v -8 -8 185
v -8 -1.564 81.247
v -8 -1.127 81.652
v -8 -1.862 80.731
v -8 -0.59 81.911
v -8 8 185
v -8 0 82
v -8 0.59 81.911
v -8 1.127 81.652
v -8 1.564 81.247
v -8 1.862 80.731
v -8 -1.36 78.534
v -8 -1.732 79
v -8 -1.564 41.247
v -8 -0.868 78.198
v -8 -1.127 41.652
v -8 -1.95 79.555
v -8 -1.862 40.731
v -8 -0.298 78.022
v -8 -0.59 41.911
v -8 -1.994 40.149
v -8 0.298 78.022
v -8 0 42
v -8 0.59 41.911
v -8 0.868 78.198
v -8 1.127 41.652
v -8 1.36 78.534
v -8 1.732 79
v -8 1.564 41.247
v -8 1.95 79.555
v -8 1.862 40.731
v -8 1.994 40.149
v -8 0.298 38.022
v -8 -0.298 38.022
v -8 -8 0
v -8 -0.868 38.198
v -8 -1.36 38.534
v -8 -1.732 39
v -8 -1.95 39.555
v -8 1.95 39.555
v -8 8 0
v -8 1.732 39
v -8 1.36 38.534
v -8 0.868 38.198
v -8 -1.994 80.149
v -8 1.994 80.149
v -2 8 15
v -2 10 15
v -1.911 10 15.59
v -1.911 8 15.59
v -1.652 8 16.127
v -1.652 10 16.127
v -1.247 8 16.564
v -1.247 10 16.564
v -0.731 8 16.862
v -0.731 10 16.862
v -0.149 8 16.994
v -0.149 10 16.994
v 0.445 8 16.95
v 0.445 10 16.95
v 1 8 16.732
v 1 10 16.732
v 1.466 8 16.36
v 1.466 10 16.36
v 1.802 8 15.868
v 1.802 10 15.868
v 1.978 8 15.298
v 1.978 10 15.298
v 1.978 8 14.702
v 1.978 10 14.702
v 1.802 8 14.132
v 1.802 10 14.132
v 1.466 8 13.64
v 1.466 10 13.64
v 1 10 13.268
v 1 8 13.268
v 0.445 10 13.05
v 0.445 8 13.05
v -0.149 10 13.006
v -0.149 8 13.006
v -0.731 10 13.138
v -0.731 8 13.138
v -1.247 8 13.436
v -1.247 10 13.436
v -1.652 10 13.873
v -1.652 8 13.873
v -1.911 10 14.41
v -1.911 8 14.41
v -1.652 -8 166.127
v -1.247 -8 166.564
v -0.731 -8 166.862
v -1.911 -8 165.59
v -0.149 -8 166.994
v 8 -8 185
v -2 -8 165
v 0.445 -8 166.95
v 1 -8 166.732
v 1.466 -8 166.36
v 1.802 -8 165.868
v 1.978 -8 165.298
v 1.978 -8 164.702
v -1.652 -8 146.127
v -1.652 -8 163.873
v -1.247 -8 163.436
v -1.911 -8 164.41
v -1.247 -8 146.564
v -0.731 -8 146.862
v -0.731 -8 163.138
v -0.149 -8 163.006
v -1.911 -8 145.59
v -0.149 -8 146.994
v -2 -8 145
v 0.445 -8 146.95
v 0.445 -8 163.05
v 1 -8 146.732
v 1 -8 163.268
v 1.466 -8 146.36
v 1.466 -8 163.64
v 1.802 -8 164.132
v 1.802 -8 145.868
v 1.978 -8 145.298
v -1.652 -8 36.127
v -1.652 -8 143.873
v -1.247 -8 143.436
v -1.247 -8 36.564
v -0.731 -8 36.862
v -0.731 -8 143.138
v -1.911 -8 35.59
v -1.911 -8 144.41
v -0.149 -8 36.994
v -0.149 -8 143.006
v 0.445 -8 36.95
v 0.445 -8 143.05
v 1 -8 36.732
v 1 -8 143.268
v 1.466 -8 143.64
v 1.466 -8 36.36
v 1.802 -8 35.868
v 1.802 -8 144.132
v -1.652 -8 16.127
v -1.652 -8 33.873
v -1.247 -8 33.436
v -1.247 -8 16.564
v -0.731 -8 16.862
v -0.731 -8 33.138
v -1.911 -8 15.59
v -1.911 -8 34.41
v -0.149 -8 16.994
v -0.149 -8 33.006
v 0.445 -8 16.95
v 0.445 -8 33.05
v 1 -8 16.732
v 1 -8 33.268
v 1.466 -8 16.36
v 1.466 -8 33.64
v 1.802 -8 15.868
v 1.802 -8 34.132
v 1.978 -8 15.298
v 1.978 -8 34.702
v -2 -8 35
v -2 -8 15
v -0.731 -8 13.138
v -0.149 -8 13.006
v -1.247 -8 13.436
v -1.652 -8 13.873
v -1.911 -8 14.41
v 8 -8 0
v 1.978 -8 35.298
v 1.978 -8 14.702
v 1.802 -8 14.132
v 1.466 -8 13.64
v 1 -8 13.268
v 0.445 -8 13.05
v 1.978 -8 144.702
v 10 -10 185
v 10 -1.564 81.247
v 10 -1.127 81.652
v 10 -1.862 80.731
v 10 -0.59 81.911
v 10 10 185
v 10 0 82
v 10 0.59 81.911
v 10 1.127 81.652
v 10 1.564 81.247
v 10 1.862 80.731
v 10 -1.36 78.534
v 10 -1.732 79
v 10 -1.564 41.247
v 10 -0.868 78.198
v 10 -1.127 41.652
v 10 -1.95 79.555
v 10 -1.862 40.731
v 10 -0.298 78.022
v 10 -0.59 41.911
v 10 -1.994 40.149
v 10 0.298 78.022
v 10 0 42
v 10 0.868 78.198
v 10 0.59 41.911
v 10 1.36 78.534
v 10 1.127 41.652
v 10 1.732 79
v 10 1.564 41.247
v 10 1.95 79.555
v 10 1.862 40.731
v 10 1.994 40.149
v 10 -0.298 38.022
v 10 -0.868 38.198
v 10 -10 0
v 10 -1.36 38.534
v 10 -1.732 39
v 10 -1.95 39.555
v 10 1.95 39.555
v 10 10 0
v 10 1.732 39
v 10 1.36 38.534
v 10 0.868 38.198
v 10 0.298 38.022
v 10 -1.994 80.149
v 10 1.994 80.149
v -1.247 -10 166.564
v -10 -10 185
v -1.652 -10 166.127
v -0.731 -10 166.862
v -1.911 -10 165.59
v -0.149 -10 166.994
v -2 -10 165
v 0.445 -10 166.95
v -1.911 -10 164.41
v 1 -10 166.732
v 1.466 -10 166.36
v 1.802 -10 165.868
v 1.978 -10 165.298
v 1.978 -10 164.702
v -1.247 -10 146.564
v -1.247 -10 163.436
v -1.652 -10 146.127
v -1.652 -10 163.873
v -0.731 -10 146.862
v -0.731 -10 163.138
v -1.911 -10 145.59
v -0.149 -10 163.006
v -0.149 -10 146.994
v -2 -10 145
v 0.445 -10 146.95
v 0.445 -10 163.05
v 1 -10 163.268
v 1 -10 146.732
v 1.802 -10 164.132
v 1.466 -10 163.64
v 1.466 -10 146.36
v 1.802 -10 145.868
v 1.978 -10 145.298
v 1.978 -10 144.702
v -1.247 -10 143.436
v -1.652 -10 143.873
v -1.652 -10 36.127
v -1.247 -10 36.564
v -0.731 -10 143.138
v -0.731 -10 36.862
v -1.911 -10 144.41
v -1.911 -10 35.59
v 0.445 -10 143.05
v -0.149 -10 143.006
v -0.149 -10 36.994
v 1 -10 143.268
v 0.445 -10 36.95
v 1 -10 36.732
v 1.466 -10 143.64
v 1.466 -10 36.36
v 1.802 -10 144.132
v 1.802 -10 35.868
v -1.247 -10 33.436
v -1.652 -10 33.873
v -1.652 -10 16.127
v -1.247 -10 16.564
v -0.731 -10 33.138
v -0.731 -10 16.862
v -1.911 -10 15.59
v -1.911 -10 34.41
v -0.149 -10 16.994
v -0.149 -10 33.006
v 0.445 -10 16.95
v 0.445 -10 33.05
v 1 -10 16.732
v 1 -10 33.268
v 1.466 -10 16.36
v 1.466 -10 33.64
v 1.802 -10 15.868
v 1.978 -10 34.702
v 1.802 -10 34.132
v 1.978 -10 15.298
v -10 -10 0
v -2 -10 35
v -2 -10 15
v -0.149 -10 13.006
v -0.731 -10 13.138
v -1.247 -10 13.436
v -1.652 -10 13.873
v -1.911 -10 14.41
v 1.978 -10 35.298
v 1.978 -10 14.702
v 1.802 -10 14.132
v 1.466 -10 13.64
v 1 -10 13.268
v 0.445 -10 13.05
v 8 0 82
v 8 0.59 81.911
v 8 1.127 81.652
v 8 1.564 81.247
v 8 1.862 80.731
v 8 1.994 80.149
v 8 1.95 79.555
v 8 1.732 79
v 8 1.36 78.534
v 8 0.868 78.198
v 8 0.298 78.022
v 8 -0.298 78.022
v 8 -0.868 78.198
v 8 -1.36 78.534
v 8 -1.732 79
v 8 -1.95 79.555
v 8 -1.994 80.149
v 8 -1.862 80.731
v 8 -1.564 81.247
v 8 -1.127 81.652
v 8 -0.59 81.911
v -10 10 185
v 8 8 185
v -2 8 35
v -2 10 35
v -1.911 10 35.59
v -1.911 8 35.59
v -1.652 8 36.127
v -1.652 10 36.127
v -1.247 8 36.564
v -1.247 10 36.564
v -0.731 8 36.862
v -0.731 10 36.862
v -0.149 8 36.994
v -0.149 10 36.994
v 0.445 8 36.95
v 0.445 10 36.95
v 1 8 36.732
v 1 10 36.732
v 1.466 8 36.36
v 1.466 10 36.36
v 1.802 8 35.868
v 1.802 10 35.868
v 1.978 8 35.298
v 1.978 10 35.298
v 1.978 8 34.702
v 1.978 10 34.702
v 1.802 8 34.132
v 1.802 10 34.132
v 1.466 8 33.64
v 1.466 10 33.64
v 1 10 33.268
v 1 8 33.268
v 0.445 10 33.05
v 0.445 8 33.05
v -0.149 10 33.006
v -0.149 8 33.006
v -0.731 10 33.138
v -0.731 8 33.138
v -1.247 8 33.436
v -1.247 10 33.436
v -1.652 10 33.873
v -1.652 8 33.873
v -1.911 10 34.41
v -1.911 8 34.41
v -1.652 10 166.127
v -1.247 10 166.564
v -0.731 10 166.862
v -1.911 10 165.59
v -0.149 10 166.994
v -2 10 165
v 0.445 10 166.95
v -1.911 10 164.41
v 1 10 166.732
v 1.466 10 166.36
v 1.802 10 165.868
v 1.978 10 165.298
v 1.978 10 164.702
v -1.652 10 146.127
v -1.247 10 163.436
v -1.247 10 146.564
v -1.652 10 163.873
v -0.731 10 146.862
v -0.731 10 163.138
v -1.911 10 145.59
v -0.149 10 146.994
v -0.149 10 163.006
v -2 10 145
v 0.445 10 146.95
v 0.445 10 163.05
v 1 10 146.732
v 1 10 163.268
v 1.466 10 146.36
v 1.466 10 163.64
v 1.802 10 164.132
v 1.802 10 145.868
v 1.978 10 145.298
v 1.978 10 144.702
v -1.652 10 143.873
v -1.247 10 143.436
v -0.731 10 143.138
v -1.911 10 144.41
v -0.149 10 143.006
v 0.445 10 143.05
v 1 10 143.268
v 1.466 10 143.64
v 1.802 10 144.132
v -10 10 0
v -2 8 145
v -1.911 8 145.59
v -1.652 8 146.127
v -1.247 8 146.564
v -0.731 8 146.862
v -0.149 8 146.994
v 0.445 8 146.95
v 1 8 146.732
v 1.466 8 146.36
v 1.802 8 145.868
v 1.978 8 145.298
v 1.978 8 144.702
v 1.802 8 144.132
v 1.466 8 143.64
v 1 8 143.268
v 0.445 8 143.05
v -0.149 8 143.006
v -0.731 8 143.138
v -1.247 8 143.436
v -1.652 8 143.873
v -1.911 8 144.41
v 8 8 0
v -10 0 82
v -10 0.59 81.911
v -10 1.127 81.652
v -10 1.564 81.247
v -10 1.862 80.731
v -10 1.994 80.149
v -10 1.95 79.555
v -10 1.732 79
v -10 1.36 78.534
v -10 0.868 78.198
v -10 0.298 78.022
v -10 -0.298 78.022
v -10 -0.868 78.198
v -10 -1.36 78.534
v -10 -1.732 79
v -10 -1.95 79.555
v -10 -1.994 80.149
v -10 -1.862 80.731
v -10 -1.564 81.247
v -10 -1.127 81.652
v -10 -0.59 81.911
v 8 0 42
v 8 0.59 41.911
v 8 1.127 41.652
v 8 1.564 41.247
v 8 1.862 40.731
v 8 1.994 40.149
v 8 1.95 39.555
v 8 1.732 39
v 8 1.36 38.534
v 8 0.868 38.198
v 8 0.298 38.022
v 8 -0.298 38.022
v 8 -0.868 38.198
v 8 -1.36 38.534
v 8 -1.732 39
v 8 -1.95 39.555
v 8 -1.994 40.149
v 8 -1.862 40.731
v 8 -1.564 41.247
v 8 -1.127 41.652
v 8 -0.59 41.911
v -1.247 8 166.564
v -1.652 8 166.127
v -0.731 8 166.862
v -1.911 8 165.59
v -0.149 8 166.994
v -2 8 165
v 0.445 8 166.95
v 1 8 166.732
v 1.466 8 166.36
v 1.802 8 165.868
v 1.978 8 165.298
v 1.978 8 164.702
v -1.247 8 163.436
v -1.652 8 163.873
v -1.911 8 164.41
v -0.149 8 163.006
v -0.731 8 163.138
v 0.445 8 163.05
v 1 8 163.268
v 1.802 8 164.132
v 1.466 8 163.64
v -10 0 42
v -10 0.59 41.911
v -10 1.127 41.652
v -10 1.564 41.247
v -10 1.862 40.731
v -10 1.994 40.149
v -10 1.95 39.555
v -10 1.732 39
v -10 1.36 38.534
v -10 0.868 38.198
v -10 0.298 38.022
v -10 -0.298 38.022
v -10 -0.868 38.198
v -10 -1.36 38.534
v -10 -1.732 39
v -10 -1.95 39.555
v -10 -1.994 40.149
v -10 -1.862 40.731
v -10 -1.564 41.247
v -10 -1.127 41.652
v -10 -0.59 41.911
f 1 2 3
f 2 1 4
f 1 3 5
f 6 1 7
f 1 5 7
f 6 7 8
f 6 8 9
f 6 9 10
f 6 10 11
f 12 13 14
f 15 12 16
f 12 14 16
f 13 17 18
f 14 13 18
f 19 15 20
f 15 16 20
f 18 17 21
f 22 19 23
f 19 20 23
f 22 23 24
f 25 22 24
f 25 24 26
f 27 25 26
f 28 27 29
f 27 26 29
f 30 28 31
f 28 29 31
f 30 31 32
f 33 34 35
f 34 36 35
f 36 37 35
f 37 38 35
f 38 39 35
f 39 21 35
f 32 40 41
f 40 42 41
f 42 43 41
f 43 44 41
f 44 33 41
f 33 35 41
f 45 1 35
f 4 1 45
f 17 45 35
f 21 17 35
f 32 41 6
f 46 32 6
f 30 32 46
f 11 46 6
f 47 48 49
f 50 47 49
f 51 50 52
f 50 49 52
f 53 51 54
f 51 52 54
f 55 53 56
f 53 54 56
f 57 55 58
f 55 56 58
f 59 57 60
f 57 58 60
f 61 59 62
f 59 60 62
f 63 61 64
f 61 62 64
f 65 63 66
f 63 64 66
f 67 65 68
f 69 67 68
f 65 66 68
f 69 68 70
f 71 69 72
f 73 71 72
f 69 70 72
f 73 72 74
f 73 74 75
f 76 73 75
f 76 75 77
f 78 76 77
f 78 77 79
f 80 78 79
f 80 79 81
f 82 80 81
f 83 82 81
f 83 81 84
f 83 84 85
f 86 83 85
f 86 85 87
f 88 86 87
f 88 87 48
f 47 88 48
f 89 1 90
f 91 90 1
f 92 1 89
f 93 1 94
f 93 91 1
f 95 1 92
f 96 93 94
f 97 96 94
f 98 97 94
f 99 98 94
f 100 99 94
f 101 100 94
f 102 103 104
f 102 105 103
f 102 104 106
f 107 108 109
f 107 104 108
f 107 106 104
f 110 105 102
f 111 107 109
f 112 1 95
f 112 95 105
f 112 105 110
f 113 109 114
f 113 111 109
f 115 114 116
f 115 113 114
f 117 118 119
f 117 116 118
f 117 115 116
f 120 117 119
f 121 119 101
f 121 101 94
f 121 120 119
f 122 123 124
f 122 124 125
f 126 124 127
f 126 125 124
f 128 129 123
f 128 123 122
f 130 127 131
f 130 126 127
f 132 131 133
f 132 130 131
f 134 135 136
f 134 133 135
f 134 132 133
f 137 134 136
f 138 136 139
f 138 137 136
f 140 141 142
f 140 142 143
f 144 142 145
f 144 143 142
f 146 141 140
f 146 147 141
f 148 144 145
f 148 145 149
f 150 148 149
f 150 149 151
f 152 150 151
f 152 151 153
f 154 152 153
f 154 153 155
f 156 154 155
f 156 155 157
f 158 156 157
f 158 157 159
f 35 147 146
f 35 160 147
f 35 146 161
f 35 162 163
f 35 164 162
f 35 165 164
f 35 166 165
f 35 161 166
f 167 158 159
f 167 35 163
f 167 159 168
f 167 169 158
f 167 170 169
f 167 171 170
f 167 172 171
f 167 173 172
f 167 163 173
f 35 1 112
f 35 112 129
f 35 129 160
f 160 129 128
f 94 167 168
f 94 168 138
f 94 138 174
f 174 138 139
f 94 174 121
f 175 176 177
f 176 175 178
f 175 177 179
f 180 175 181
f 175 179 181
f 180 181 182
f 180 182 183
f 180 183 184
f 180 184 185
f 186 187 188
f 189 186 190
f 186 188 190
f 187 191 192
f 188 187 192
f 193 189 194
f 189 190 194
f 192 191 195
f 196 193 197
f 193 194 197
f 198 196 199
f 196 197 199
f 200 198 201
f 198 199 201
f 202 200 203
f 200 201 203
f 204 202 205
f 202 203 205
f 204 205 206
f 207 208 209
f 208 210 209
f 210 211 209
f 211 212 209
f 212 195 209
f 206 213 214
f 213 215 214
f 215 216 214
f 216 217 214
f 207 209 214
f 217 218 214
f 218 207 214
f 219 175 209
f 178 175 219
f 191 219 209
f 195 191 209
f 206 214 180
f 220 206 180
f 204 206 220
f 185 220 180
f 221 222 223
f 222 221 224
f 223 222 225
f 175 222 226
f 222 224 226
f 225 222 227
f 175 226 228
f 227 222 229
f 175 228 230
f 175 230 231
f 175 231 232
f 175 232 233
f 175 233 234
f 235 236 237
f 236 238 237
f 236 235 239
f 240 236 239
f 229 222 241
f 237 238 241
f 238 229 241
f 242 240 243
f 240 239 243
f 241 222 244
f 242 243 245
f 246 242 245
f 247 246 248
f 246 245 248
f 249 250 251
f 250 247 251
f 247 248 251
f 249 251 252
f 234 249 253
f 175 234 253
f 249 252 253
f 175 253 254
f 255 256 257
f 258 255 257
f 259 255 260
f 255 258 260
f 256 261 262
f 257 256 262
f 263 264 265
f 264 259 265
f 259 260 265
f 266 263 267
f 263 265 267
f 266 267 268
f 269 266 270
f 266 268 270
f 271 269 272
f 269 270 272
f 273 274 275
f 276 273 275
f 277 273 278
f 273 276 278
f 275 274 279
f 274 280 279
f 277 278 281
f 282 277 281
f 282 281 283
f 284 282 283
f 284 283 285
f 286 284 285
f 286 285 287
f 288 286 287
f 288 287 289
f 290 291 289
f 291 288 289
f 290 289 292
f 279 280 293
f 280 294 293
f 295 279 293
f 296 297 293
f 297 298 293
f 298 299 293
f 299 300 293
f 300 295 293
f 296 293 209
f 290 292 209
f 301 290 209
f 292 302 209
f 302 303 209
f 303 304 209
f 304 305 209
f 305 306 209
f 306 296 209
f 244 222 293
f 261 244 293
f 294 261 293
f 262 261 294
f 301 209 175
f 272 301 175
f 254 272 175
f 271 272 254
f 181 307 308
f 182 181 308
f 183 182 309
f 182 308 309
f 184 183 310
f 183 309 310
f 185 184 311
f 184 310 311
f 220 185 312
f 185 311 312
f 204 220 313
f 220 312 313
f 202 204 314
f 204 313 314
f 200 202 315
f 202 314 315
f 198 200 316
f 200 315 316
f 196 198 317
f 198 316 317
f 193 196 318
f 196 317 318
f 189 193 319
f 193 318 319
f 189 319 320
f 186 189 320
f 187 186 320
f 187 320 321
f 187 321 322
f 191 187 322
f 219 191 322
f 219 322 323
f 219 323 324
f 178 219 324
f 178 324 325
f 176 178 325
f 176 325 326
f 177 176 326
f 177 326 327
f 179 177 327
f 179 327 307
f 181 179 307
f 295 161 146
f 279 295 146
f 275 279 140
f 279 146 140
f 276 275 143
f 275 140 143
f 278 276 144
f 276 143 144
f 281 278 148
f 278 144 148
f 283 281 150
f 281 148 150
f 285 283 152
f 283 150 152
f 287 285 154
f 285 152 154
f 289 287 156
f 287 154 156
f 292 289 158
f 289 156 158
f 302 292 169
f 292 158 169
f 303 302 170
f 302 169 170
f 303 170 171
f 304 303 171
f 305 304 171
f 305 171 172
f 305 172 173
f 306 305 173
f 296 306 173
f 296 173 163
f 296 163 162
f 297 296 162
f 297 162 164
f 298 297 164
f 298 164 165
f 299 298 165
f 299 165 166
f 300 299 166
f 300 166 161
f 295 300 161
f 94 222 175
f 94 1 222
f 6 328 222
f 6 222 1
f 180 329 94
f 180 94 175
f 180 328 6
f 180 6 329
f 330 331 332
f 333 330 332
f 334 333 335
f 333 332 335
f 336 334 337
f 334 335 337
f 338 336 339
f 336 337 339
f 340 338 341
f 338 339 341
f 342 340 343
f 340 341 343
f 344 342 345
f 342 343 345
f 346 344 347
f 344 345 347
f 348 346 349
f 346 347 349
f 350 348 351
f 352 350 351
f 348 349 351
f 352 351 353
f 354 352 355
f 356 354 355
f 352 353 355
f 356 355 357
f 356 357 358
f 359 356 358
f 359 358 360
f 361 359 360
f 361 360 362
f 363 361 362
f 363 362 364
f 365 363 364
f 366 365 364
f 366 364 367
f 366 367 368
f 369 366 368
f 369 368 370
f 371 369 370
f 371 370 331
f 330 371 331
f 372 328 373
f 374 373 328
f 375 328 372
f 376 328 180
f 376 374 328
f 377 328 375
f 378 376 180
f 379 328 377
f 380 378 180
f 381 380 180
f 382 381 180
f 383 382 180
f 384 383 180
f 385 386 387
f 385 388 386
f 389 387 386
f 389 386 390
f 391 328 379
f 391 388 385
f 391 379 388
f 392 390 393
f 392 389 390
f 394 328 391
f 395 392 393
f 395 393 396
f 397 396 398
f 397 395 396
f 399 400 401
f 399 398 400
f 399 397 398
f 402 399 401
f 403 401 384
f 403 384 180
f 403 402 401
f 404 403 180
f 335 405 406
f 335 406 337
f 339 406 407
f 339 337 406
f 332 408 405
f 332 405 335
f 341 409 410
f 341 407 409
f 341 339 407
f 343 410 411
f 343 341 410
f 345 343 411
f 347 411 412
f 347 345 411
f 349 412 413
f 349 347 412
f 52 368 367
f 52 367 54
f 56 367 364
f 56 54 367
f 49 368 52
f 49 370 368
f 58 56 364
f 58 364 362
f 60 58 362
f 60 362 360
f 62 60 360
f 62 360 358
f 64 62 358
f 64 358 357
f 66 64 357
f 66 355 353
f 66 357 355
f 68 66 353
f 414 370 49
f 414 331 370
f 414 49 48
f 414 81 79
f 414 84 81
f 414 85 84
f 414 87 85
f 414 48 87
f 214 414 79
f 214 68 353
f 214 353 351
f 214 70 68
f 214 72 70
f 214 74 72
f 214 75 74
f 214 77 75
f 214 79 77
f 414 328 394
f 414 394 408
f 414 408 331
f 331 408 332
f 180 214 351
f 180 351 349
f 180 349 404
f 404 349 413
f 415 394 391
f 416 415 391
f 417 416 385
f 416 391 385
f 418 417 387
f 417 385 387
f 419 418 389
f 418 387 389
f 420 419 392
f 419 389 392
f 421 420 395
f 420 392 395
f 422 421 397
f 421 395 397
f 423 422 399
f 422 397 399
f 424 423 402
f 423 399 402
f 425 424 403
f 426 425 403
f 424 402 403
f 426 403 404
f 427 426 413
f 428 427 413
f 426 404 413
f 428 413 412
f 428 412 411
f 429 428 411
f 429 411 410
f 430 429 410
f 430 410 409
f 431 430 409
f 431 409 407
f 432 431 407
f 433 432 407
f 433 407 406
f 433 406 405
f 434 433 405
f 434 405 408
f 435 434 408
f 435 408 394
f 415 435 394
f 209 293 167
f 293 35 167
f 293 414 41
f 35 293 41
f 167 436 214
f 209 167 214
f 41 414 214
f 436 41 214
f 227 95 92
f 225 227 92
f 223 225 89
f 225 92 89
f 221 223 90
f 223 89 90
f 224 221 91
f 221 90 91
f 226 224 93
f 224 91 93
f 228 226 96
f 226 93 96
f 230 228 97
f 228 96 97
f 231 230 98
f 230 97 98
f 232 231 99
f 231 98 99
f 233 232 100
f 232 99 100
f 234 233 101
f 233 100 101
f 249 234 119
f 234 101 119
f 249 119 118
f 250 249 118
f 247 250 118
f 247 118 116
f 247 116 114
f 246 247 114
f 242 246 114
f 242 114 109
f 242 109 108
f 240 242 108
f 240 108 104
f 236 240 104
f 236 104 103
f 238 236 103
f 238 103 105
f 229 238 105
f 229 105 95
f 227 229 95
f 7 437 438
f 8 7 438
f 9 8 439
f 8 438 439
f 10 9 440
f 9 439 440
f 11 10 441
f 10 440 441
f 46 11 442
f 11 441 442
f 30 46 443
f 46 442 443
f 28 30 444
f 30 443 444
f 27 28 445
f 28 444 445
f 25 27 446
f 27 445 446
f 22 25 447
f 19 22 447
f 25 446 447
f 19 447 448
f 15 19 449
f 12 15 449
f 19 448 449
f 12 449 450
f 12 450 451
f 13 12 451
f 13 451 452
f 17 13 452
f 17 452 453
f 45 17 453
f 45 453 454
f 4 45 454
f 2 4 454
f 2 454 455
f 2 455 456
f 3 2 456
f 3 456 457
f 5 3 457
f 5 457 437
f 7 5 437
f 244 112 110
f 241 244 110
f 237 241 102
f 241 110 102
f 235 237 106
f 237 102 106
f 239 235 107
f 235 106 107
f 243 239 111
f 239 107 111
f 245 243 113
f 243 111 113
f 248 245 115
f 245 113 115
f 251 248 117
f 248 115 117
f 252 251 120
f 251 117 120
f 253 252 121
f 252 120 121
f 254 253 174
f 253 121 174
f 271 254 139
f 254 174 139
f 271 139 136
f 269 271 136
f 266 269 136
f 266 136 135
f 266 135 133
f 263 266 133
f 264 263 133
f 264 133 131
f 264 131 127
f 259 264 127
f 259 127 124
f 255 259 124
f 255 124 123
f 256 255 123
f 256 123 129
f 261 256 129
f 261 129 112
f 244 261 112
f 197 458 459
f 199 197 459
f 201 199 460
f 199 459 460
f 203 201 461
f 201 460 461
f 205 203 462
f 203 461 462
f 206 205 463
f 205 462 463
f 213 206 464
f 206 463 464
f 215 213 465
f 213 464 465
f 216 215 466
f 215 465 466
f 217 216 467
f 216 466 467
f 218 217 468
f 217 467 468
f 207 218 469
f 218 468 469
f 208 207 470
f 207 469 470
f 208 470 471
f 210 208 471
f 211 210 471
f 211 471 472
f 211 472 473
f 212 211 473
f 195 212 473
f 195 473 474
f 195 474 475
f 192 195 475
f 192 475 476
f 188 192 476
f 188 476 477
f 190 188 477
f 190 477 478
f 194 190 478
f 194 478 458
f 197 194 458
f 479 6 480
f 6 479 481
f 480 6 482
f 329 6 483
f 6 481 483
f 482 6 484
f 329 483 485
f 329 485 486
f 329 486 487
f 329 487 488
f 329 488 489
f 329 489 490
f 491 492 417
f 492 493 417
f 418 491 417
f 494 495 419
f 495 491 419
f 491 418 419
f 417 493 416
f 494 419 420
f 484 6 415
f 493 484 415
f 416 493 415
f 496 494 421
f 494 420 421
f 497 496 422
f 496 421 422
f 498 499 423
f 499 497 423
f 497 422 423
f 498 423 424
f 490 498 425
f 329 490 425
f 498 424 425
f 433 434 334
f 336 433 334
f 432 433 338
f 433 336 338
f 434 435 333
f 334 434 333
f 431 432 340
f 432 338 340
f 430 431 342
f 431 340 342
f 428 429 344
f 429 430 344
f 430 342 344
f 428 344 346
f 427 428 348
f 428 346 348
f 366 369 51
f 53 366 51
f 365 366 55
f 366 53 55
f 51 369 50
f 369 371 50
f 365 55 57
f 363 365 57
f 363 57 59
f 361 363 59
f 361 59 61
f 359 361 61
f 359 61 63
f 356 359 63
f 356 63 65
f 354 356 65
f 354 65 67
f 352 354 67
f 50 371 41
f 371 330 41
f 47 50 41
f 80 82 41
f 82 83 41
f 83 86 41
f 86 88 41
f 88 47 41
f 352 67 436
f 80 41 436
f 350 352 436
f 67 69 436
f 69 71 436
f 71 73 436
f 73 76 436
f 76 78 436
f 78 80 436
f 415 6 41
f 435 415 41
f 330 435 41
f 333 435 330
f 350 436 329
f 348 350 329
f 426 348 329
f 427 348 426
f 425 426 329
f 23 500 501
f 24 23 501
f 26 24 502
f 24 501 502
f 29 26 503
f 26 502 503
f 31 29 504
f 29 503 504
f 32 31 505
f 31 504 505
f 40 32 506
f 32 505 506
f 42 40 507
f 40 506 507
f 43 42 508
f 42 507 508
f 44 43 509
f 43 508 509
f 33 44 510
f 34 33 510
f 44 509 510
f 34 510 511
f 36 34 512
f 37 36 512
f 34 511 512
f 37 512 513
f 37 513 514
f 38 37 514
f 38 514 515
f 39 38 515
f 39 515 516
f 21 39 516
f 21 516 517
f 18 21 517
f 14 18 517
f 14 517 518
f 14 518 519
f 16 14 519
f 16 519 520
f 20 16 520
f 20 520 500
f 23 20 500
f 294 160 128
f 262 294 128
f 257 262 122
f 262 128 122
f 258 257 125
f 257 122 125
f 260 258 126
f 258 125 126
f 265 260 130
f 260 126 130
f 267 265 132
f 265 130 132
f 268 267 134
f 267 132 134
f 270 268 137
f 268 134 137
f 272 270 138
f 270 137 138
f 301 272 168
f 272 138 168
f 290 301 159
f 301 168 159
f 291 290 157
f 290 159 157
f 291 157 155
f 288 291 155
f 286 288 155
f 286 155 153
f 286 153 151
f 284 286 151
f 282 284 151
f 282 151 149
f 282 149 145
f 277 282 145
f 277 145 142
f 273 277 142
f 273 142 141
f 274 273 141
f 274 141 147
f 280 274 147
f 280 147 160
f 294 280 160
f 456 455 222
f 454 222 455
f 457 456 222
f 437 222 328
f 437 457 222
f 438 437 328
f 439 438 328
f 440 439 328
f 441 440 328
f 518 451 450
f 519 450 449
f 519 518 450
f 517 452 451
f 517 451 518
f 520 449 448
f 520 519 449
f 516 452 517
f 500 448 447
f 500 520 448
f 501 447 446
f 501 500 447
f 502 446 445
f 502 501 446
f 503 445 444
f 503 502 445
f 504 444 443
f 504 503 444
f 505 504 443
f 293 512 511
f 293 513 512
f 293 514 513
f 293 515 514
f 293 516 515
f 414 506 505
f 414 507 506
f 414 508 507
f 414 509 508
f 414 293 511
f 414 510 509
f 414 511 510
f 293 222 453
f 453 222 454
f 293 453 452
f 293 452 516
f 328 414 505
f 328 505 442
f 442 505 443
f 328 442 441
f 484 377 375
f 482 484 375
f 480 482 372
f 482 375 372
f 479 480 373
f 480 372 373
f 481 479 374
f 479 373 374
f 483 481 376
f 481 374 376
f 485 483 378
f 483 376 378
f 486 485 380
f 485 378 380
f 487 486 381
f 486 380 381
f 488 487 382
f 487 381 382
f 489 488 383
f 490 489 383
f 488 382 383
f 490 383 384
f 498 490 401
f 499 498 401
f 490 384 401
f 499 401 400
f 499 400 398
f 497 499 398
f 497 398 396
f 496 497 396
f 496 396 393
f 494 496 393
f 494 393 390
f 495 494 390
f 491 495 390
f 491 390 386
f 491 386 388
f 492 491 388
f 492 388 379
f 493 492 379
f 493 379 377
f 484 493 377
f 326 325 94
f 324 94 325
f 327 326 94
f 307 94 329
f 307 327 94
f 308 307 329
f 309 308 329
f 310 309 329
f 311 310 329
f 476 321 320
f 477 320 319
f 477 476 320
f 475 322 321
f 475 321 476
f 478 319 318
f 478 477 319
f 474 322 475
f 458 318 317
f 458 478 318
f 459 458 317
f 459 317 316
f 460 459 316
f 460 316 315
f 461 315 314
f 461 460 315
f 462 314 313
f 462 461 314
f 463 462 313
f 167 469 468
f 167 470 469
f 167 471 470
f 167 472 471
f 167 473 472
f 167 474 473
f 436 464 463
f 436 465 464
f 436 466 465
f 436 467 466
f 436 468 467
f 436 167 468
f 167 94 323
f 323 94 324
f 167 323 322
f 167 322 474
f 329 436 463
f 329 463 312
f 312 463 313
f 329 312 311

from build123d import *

# Parameters (mm, degrees)
SKETCH_1_W          = 20
SKETCH_1_H          = 20
SKETCH_1_W_2        = 16
SKETCH_1_H_2        = 16
EXTRUDE_1_DEPTH     = 185
SKETCH_2_R          = 2
CUT_EXTRUDE_1_DEPTH = 187.346451536
SKETCH_3_R          = 2
CUT_EXTRUDE_2_DEPTH = 187.346451536


with BuildPart() as part:
    # 草图1 → 凸台-拉伸1 (new body)
    with BuildSketch(Plane.XY):
        Rectangle(SKETCH_1_W, SKETCH_1_H)
        Rectangle(SKETCH_1_W_2, SKETCH_1_H_2, mode=Mode.SUBTRACT)
    extrude(amount=EXTRUDE_1_DEPTH)

    # 草图2 → 切除-拉伸1 (cut, through all)
    with BuildSketch(Plane(origin=(0, 10, 0), x_dir=(1, 0, 0), z_dir=(0, 1, 0))):
        with Locations(Location((0, -15, 0), (0, 0, 180))):
            Circle(SKETCH_2_R)
        with Locations(Location((0, -35, 0), (0, 0, 180))):
            Circle(SKETCH_2_R)
        with Locations(Location((0, -165, 0), (0, 0, 180))):
            Circle(SKETCH_2_R)
        with Locations(Location((0, -145, 0), (0, 0, 180))):
            Circle(SKETCH_2_R)
    extrude(amount=-CUT_EXTRUDE_1_DEPTH, mode=Mode.SUBTRACT)

    # 草图3 → 切除-拉伸2 (cut, through all)
    with BuildSketch(Plane.ZY.offset(10)):
        with Locations((40, 0)):
            Circle(SKETCH_3_R)
        with Locations((80, 0)):
            Circle(SKETCH_3_R)
    extrude(amount=-CUT_EXTRUDE_2_DEPTH, mode=Mode.SUBTRACT)


solid = part.part
